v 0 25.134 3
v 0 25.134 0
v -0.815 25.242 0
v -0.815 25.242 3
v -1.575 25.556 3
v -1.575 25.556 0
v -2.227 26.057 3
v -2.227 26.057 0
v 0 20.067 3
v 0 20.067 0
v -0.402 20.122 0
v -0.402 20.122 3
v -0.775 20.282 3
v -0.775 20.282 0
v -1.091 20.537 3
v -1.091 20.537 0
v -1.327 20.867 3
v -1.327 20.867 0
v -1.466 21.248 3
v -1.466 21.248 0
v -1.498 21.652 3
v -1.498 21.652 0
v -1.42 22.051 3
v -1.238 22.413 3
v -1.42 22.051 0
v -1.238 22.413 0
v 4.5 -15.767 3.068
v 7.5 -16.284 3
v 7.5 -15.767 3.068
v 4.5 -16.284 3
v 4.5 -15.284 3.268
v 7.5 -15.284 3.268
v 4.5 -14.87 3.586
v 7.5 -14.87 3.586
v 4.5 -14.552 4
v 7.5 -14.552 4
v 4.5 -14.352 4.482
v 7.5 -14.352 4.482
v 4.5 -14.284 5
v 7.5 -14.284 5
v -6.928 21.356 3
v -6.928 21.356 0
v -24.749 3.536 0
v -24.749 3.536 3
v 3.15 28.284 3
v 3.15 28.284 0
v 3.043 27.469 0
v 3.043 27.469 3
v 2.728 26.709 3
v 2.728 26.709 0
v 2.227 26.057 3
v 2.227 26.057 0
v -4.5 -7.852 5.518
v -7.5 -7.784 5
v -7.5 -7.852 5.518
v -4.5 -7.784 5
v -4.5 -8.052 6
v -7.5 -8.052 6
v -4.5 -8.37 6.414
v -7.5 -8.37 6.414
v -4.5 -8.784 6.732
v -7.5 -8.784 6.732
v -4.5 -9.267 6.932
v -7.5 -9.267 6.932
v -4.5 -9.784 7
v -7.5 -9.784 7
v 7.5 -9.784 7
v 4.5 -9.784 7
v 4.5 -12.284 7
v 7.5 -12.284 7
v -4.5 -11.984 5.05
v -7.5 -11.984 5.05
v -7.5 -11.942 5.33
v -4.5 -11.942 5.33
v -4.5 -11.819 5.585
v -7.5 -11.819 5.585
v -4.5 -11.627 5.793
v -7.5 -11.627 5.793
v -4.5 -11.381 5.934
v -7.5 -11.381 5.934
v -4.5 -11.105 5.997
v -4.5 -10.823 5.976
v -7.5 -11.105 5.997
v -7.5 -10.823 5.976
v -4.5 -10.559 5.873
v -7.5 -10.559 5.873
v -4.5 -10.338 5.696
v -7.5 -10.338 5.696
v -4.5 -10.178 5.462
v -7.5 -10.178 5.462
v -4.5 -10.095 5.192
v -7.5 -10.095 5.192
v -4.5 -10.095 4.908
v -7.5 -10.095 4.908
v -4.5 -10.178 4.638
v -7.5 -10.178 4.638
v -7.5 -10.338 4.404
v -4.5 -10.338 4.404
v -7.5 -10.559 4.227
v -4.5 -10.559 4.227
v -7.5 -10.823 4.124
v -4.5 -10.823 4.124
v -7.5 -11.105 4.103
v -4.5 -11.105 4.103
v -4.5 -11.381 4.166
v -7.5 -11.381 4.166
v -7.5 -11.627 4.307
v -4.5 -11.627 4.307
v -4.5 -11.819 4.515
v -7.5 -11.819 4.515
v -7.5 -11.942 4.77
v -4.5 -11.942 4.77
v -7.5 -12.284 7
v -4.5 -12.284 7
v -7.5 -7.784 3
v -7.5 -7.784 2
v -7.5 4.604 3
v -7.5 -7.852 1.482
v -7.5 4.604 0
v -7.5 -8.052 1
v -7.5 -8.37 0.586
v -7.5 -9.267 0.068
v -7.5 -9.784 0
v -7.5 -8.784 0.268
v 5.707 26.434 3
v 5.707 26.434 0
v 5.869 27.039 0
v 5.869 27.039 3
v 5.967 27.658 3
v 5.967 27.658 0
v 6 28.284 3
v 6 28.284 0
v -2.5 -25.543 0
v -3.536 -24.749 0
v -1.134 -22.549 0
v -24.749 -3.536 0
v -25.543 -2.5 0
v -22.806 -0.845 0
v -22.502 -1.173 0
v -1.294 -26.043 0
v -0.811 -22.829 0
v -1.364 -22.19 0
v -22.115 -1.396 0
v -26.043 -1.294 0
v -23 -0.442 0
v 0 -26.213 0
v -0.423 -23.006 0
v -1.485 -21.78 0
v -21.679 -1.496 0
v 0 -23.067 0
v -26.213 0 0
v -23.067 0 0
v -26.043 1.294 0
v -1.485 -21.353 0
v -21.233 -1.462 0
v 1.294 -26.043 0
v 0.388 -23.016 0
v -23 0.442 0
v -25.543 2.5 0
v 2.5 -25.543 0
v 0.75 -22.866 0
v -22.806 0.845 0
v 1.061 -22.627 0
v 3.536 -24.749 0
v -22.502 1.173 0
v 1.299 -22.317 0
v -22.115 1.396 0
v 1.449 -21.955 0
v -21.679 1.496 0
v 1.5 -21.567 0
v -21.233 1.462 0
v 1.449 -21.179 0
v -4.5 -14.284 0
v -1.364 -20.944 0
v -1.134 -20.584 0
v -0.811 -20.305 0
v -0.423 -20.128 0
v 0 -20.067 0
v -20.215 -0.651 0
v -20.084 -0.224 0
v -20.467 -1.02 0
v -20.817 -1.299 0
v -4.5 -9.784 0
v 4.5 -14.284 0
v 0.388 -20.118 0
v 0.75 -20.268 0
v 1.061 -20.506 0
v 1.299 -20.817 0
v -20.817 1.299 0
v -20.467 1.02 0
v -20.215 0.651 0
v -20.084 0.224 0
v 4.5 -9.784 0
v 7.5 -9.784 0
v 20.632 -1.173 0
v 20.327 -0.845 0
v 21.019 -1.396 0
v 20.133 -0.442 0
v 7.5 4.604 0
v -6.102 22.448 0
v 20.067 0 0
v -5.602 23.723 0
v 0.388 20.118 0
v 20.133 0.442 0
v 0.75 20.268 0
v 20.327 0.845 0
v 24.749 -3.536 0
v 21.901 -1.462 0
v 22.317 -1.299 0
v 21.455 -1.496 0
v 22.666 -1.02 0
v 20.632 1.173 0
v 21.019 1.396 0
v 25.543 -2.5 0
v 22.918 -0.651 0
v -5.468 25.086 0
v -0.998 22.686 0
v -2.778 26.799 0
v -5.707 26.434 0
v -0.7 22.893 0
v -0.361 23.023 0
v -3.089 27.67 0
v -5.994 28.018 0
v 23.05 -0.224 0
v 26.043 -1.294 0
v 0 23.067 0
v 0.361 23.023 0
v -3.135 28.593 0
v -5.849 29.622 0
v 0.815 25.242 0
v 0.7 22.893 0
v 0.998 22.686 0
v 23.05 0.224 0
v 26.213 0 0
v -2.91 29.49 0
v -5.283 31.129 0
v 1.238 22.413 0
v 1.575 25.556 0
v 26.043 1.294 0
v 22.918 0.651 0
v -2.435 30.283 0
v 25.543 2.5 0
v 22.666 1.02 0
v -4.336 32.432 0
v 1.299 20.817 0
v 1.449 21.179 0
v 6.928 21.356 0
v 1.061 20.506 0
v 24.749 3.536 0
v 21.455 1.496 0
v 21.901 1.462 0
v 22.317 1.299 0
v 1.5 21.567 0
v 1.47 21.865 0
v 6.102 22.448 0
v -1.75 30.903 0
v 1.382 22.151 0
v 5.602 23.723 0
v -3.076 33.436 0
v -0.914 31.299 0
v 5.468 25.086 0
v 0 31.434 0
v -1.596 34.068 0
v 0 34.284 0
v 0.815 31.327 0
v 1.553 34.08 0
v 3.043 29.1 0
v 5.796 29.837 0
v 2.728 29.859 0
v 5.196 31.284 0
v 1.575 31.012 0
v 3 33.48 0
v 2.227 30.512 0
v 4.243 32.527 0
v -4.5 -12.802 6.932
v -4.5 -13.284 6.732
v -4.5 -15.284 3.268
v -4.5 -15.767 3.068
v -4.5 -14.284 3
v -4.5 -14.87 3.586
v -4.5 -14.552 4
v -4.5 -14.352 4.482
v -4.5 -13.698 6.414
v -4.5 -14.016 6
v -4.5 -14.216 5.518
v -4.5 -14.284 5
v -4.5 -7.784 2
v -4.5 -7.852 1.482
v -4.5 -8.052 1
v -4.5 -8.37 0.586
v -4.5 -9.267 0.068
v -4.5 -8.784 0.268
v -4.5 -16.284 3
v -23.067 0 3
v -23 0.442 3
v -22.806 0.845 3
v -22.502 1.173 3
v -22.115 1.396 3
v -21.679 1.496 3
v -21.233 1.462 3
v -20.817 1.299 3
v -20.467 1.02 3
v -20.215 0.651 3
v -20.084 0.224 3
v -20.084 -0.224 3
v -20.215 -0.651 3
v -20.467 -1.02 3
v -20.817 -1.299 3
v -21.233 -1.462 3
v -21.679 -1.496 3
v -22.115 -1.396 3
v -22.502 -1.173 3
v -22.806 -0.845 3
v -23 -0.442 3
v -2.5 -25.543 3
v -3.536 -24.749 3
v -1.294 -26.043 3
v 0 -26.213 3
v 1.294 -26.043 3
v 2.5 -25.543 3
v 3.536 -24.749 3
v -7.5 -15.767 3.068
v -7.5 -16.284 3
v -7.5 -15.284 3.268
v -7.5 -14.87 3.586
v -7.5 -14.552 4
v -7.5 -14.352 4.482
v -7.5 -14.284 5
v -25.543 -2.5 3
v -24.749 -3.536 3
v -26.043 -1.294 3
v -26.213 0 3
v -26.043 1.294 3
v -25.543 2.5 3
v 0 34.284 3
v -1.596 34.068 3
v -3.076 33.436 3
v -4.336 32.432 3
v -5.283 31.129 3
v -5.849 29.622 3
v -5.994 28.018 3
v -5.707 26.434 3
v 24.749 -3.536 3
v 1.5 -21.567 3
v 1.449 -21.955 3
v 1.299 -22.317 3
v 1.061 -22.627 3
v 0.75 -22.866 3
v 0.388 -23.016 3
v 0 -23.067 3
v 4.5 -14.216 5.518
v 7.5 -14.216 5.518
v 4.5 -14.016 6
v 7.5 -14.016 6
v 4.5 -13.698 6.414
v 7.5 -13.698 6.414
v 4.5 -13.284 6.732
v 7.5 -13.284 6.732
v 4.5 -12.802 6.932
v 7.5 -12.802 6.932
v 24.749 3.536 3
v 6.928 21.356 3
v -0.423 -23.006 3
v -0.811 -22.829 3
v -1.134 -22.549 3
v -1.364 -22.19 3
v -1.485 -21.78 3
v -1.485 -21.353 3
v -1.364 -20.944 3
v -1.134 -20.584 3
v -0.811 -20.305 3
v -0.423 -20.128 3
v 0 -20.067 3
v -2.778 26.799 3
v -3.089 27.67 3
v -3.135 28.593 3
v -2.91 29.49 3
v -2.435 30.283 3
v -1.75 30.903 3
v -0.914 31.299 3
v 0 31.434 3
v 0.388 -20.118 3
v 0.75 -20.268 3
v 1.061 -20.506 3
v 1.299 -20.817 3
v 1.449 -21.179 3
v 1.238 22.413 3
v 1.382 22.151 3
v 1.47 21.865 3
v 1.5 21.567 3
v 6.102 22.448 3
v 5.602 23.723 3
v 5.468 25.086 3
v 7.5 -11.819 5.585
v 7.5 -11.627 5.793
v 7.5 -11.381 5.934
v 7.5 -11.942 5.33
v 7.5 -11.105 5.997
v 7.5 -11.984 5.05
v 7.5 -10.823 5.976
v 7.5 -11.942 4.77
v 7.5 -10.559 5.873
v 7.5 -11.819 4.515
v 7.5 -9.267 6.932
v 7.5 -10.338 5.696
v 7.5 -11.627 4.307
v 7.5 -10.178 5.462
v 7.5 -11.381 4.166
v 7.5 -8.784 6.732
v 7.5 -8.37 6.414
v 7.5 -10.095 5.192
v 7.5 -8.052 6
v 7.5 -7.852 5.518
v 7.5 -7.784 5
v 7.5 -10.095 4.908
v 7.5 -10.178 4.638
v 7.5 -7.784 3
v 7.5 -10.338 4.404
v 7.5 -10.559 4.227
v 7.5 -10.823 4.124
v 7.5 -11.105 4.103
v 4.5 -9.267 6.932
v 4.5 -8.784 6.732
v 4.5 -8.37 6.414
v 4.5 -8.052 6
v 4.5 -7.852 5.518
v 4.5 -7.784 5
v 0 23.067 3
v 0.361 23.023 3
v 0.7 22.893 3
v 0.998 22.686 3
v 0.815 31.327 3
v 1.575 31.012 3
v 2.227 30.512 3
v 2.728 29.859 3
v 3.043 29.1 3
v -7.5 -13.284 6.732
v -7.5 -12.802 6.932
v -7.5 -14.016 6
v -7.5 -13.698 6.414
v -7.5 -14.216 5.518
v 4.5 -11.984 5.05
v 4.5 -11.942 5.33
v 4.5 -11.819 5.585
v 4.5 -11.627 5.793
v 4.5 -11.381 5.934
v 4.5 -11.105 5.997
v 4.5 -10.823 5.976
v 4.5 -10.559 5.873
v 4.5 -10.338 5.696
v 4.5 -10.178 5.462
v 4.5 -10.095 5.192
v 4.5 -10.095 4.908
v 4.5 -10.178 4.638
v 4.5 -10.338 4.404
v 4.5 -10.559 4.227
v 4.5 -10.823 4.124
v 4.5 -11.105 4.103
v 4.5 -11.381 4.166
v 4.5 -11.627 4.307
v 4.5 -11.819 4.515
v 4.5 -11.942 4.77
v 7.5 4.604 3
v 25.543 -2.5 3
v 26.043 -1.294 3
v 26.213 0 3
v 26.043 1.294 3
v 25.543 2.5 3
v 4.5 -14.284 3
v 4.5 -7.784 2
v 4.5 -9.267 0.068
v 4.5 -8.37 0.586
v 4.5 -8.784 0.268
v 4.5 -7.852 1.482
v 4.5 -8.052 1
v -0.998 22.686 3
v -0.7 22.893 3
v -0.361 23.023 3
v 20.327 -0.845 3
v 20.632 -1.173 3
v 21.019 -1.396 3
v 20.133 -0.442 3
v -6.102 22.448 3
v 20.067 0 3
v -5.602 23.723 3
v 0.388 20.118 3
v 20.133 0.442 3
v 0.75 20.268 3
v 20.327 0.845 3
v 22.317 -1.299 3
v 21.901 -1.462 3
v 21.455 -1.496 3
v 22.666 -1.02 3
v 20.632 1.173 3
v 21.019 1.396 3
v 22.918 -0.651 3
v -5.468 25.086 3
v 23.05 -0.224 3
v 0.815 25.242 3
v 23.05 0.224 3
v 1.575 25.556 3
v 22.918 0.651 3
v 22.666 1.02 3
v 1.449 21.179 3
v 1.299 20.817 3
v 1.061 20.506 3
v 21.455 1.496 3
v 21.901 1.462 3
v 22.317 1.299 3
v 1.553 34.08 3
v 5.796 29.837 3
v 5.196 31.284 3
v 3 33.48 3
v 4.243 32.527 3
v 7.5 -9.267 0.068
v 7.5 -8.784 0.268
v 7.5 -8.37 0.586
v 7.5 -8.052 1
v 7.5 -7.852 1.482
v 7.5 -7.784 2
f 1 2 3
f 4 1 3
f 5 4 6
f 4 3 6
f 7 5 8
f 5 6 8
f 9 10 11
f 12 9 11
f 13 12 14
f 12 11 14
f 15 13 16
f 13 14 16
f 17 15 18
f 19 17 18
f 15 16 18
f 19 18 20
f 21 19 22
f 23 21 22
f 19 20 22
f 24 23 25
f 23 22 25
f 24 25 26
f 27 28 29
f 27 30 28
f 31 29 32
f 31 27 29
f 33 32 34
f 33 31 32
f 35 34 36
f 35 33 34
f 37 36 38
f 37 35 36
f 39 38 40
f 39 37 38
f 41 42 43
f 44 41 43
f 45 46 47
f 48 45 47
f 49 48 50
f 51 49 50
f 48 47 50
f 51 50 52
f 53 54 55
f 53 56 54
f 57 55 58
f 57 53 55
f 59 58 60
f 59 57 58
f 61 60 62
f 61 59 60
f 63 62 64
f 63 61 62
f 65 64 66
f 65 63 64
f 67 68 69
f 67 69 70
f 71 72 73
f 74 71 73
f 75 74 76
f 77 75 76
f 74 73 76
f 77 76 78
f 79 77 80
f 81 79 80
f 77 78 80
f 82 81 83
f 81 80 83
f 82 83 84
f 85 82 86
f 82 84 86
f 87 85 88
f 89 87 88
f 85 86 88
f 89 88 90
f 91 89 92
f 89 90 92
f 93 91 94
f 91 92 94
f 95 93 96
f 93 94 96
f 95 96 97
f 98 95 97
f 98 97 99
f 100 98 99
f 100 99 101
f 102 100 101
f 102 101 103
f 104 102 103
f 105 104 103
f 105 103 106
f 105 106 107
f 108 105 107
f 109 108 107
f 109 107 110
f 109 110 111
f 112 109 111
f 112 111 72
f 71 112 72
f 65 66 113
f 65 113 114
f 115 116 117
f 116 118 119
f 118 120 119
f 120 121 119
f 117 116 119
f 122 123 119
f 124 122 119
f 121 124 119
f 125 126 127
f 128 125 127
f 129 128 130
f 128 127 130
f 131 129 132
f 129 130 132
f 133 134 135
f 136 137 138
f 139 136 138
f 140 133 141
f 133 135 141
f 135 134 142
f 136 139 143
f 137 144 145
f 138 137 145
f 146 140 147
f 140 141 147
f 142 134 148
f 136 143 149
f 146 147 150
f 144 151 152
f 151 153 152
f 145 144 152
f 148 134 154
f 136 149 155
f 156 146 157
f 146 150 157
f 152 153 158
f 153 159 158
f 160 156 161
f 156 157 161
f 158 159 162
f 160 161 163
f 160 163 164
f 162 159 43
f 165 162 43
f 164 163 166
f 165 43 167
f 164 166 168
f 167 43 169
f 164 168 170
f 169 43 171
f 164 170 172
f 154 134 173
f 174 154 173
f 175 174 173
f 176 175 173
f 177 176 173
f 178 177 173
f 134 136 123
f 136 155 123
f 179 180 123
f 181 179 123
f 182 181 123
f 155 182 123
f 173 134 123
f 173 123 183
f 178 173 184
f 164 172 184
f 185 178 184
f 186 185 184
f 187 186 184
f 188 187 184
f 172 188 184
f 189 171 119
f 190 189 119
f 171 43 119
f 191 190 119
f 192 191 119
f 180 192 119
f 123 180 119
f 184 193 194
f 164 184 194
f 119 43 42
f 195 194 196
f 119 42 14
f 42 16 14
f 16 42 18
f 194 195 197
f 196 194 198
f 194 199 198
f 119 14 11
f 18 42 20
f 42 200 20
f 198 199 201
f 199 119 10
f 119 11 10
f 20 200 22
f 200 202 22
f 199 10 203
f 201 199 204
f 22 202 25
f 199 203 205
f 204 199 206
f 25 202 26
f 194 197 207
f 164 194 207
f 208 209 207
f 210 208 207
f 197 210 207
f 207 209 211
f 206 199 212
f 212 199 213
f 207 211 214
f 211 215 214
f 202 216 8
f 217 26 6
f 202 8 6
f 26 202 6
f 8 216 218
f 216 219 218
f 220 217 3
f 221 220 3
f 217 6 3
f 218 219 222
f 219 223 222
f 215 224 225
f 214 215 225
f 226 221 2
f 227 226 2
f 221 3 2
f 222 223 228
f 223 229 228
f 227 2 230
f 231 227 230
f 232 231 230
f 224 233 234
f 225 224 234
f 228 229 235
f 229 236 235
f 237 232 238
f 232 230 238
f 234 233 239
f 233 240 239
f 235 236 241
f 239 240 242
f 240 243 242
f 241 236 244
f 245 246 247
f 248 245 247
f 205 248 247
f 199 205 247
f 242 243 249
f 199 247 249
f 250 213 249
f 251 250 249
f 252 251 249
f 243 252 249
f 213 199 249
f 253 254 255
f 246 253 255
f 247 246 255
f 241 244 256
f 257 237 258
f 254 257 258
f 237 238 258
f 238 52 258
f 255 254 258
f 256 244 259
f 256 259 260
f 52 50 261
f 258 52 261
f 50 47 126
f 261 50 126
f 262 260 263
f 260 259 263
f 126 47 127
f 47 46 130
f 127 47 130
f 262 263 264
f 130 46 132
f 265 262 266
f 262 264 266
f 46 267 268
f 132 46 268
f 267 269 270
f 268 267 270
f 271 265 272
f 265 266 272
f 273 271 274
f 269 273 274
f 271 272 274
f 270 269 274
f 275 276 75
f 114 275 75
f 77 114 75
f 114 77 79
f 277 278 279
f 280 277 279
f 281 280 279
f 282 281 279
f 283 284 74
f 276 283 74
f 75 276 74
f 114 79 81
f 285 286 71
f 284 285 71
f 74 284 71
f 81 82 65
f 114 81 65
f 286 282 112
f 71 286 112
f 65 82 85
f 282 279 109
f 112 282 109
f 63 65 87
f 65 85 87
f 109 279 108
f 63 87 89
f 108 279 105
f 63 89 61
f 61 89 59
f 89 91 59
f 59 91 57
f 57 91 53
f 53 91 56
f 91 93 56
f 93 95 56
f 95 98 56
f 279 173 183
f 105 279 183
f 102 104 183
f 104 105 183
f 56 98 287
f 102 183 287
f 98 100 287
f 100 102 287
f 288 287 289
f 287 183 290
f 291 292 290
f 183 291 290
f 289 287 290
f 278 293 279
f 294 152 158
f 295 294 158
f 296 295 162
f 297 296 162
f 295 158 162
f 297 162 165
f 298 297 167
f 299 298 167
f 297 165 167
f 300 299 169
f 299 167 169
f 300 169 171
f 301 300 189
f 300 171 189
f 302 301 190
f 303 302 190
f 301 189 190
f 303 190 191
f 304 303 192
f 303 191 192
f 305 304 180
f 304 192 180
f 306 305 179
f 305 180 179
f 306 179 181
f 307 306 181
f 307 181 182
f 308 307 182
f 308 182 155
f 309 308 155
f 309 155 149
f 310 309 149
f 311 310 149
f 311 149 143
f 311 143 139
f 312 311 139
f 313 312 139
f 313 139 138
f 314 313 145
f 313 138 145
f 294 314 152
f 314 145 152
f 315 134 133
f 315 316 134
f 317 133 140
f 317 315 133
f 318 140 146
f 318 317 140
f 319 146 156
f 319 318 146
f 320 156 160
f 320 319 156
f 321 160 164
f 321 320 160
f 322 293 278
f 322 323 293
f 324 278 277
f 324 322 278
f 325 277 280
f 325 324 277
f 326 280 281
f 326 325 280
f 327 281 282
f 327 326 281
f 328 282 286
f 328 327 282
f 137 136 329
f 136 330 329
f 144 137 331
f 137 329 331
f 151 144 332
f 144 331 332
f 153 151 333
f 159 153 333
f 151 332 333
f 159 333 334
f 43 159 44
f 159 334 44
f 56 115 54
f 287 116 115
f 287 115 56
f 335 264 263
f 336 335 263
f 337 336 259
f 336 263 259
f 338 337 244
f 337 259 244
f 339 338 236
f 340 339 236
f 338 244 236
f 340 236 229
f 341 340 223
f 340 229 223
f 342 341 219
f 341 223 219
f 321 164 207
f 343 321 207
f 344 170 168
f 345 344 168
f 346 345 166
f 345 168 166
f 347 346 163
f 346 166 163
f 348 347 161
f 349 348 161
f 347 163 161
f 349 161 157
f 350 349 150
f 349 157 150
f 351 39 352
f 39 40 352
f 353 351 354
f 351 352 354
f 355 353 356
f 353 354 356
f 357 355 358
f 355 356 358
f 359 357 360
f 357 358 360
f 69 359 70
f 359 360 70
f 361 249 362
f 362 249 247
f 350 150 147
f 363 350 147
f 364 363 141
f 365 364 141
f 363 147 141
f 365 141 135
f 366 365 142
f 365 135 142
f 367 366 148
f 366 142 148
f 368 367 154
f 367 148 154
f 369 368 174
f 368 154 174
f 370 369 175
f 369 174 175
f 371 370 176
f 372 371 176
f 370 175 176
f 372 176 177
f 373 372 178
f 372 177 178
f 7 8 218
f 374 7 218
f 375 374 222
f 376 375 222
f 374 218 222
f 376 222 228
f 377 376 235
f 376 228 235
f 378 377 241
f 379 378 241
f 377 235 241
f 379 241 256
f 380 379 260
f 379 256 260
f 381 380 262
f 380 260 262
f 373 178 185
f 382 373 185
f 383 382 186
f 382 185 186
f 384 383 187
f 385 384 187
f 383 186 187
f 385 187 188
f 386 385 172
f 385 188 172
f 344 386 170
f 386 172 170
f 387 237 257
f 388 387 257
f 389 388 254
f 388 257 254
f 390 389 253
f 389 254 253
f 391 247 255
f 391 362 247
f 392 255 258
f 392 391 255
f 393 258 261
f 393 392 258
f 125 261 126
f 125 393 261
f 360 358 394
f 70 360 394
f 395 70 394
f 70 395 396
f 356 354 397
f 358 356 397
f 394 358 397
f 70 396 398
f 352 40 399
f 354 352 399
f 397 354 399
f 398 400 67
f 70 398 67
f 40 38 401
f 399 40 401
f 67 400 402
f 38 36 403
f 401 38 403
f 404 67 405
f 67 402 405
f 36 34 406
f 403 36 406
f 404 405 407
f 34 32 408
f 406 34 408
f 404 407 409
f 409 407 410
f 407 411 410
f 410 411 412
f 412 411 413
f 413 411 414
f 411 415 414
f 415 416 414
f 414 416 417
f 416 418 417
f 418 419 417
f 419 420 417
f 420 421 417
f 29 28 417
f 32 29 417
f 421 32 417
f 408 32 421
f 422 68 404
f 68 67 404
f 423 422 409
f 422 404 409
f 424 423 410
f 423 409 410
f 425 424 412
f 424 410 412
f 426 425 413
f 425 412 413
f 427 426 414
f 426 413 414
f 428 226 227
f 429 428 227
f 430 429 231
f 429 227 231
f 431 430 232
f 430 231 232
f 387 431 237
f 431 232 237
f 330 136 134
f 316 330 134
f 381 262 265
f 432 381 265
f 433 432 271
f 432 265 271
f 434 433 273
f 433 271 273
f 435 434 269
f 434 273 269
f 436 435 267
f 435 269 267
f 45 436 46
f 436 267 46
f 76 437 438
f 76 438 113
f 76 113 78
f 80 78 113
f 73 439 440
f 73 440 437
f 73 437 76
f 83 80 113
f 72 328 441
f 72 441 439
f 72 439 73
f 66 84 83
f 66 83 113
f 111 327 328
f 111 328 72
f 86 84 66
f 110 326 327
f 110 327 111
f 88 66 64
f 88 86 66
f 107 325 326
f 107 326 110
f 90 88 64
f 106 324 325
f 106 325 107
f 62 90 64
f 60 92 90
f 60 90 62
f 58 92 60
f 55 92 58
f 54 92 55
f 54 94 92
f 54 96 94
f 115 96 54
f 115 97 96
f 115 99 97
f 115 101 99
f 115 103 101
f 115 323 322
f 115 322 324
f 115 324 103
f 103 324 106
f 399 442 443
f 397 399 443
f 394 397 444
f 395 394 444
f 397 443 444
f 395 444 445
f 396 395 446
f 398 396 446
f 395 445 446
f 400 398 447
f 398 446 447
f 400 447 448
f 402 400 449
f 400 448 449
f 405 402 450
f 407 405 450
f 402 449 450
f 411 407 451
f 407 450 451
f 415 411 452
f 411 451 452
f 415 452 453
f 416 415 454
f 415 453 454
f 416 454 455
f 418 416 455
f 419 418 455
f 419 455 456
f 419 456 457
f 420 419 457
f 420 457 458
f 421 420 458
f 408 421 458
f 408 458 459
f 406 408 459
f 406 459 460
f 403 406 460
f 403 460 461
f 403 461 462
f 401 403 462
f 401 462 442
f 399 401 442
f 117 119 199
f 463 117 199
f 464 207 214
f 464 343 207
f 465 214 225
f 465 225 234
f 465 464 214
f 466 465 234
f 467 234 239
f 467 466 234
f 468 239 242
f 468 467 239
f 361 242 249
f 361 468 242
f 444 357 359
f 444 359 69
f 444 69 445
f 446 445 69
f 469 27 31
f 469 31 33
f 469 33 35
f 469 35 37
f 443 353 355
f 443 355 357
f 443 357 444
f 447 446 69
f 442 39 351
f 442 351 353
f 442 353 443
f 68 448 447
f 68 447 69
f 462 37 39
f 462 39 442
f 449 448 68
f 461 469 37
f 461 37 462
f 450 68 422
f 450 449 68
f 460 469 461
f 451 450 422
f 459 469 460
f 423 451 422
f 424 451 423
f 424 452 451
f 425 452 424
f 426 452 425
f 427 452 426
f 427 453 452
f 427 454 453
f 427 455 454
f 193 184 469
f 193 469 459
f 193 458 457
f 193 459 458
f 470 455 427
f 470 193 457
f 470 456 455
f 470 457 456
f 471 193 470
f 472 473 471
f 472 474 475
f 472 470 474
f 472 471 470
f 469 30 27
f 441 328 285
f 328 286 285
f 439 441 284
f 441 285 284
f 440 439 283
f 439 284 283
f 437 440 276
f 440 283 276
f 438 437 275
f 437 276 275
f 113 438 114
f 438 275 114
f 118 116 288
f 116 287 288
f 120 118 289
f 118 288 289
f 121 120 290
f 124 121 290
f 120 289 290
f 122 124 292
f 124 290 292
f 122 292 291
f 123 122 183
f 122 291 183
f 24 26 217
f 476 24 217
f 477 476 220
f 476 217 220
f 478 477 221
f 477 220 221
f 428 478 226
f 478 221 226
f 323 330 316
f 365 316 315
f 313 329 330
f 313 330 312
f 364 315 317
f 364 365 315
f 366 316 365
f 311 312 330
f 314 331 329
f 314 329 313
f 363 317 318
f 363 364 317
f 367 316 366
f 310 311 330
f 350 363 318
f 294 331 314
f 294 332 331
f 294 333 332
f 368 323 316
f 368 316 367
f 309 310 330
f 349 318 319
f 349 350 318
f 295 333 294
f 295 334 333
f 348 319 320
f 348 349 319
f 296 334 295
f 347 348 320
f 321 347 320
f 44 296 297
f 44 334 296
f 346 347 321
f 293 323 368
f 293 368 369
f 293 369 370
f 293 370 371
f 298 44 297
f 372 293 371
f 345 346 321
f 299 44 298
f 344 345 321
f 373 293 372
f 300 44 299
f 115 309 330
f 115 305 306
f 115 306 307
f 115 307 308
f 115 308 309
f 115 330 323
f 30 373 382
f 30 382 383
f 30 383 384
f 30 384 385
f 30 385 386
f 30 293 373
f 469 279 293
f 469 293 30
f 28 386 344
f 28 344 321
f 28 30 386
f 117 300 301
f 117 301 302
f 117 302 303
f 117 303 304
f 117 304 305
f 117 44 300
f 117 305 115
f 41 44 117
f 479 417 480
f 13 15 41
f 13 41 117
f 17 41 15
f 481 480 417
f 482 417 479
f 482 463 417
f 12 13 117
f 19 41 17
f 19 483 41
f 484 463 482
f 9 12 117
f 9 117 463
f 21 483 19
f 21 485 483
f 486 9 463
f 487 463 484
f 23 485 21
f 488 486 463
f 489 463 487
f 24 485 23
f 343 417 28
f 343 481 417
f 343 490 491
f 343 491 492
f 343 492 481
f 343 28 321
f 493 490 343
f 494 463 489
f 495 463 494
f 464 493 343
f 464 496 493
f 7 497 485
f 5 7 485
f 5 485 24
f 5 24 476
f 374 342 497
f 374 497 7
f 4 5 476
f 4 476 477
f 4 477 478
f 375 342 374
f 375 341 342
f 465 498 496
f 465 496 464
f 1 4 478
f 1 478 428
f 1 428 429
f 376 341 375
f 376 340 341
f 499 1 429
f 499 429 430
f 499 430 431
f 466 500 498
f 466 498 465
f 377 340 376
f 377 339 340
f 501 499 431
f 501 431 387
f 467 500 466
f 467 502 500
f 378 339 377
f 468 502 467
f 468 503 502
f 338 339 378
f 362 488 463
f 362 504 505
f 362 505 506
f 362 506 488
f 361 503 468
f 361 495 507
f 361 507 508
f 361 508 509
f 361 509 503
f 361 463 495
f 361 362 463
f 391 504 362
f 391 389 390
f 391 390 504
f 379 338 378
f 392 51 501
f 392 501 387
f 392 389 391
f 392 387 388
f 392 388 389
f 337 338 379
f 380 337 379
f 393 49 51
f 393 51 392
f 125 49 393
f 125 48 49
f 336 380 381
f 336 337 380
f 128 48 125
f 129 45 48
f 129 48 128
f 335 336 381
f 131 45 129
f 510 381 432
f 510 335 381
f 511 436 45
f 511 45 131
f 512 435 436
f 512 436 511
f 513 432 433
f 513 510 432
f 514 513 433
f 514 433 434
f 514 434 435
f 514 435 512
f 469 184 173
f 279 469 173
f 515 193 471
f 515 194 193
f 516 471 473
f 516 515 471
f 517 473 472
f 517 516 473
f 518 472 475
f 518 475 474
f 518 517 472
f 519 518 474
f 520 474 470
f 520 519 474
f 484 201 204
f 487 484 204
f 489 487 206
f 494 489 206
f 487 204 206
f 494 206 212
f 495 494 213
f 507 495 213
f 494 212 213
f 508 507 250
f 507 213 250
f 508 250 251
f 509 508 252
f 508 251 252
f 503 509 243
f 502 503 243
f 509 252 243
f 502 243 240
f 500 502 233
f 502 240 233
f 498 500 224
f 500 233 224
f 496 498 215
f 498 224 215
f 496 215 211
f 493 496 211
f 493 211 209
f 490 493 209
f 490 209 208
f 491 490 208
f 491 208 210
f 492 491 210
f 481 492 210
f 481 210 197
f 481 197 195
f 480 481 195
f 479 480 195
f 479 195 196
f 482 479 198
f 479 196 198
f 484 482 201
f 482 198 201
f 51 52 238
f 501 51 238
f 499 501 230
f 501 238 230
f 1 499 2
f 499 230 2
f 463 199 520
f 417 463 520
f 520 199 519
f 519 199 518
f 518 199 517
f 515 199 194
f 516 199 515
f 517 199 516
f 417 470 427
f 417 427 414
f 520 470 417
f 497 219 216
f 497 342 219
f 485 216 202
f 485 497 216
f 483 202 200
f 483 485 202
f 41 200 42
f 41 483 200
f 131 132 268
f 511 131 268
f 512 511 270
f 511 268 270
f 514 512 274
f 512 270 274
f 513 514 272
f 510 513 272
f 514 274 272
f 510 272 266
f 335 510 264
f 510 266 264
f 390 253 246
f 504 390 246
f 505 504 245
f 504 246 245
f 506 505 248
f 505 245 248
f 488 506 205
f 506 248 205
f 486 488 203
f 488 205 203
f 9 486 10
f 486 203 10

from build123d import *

# Parameters (mm, degrees)
F1_DEPTH = 3
F2_R     = 5
F0_W     = 3
F0_H     = 6.5
F3_DEPTH = 7
F4_R     = 0.95
F5_DEPTH = 25
F6_R     = 1.99999


# Not quite as in the source:
# - a fillet or chamfer is up to 0.001 mm smaller than in the source, because OpenCascade refuses the exact size
# - a feature names something its author has since deleted; it is built from what else it names


with BuildPart() as f1:
    # F0 (on Top) → F1 (new body)
    with BuildSketch(Plane.XY):
        with BuildLine():
            Line((-23.06675, 0), (-28.2842712475, 0))
            Line((-28.2842712475, 0), (0, -28.2842712475))
            Line((0, -28.2842712475), (0, -23.0667636524))
            ThreePointArc((0, -23.0667636524), (-1.5, -21.5667636524), (0, -20.0667636524))
            Line((0, -20.0667636524), (0, -14.2842712475))
            Line((0, -14.2842712475), (-4.5, -14.2842712475))
            Line((-4.5, -14.2842712475), (-7.5, -14.2842712475))
            Line((-7.5, -14.2842712475), (-7.5, -7.7842712475))
            Line((-7.5, -7.7842712475), (-7.5, 0))
            Line((-7.5, 0), (-20.06675, 0))
            ThreePointArc((-20.06675, 0), (-21.56675, -1.5), (-23.06675, 0))
        make_face()
        with BuildLine():
            Line((0, -23.0667636524), (0, -28.2842712475))
            Line((0, -28.2842712475), (28.2842712475, 0))
            Line((28.2842712475, 0), (23.06675, 0))
            ThreePointArc((23.06675, 0), (21.56675, -1.5), (20.06675, 0))
            Line((20.06675, 0), (7.5, 0))
            Line((7.5, 0), (7.5, -7.7842712475))
            Line((7.5, -7.7842712475), (7.5, -14.2842712475))
            Line((7.5, -14.2842712475), (4.5, -14.2842712475))
            Line((4.5, -14.2842712475), (0, -14.2842712475))
            Line((0, -14.2842712475), (0, -20.0667636524))
            ThreePointArc((0, -20.0667636524), (1.0606601718, -20.5061034806), (1.5, -21.5667636524))
            ThreePointArc((1.5, -21.5667636524), (1.0606601718, -22.6274238242), (0, -23.0667636524))
        make_face()
        with BuildLine():
            Line((-4.2426406871, 24.0416305603), (-28.2842712475, 0))
            Line((-28.2842712475, 0), (-23.06675, 0))
            ThreePointArc((-23.06675, 0), (-21.56675, 1.5), (-20.06675, 0))
            Line((-20.06675, 0), (-7.5, 0))
            Line((-7.5, 0), (-7.5, 4.6038874425))
            Line((-7.5, 4.6038874425), (0, 4.6038874425))
            Line((0, 4.6038874425), (0, 20.0667636524))
            ThreePointArc((0, 20.0667636524), (-1.3266484173, 20.8667608118), (-1.2382102141, 22.4134250167))
            ThreePointArc((-1.2382102141, 22.4134250167), (-2.8587925726, 23.0091120056), (-4.2426406871, 24.0416305603))
        make_face()
        with BuildLine():
            ThreePointArc((0, 34.2842712475), (-5.5432771951, 30.5803718417), (-4.2426406871, 24.0416305603))
            Line((-4.2426406871, 24.0416305603), (-2.2273863607, 26.0568848867))
            ThreePointArc((-2.2273863607, 26.0568848867), (-2.9102205274, 29.4897240594), (0, 31.4342712475))
            Line((0, 31.4342712475), (0, 34.2842712475))
        make_face()
        with BuildLine():
            Line((-2.2273863607, 26.0568848867), (-4.2426406871, 24.0416305603))
            ThreePointArc((-4.2426406871, 24.0416305603), (-2.8587925726, 23.0091120056), (-1.2382102141, 22.4134250167))
            ThreePointArc((-1.2382102141, 22.4134250167), (-0.7000028406, 22.8934120697), (0, 23.0667636524))
            Line((0, 23.0667636524), (0, 25.1342712475))
            ThreePointArc((0, 25.1342712475), (-1.205452812, 25.3740507201), (-2.2273863607, 26.0568848867))
        make_face()
        with BuildLine():
            ThreePointArc((6, 28.2842712475), (4.2426406871, 32.5269119346), (0, 34.2842712475))
            Line((0, 34.2842712475), (0, 31.4342712475))
            ThreePointArc((0, 31.4342712475), (2.2273863607, 30.5116576082), (3.15, 28.2842712475))
            ThreePointArc((3.15, 28.2842712475), (2.9102205274, 27.0788184355), (2.2273863607, 26.0568848867))
            Line((2.2273863607, 26.0568848867), (4.2426406871, 24.0416305603))
            ThreePointArc((4.2426406871, 24.0416305603), (5.5432771951, 25.9881706533), (6, 28.2842712475))
        make_face()
        with BuildLine():
            ThreePointArc((1.2382102141, 22.4134250167), (2.8587925726, 23.0091120056), (4.2426406871, 24.0416305603))
            Line((4.2426406871, 24.0416305603), (2.2273863607, 26.0568848867))
            ThreePointArc((2.2273863607, 26.0568848867), (1.2054528119, 25.3740507201), (0, 25.1342712475))
            Line((0, 25.1342712475), (0, 23.0667636524))
            ThreePointArc((0, 23.0667636524), (0.7000028406, 22.8934120697), (1.2382102141, 22.4134250167))
        make_face()
        with BuildLine():
            Line((23.06675, 0), (28.2842712475, 0))
            Line((28.2842712475, 0), (4.2426406871, 24.0416305603))
            ThreePointArc((4.2426406871, 24.0416305603), (2.8587925726, 23.0091120056), (1.2382102141, 22.4134250167))
            ThreePointArc((1.2382102141, 22.4134250167), (1.4330588476, 22.0098689891), (1.5, 21.5667636524))
            ThreePointArc((1.5, 21.5667636524), (1.0606601718, 20.5061034806), (0, 20.0667636524))
            Line((0, 20.0667636524), (0, 4.6038874425))
            Line((0, 4.6038874425), (7.5, 4.6038874425))
            Line((7.5, 4.6038874425), (7.5, 0))
            Line((7.5, 0), (20.06675, 0))
            ThreePointArc((20.06675, 0), (21.56675, 1.5), (23.06675, 0))
        make_face()
    extrude(amount=F1_DEPTH)

    # F2
    f2_edges = [f1.edges().sort_by_distance(p)[0] for p in [
        (-28.284271, 0, 1.5),
        (28.284271, 0, 1.5),
        (0, -28.284271, 1.5),
        (4.242641, 24.041631, 1.5),
        (-4.242641, 24.041631, 1.5),
    ]]
    fillet(f2_edges, radius=F2_R)

    # F0 (on Top) → F3 (join)
    with BuildSketch(Plane.XY):
        with Locations((-6, -11.0342712475)):
            Rectangle(F0_W, F0_H)
        with Locations((6, -11.0342712475)):
            Rectangle(F0_W, F0_H)
    extrude(amount=F3_DEPTH)

    # F4 (on face) → F5 (cut)
    with BuildSketch(Plane(origin=(-7.5, 0, 0), x_dir=(0, -1, 0), z_dir=(-1, 0, 0))):
        with Locations((11.0342712475, 5.05)):
            Circle(F4_R)
    extrude(amount=-F5_DEPTH, mode=Mode.SUBTRACT)

    # F6 (radius 2 in the source; OpenCascade refuses exactly that, so slightly less here)
    f6_edges = [f1.edges().sort_by_distance(p)[0] for p in [
        (-6, -14.284271, 7),
        (-6, -14.284271, 3),
        (-6, -7.784271, 7),
        (-6, -7.784271, 0),
        (6, -7.784271, 0),
        (6, -14.284271, 3),
        (6, -14.284271, 7),
        (6, -7.784271, 7),
    ]]
    fillet(f6_edges, radius=F6_R)


solid = f1.part
